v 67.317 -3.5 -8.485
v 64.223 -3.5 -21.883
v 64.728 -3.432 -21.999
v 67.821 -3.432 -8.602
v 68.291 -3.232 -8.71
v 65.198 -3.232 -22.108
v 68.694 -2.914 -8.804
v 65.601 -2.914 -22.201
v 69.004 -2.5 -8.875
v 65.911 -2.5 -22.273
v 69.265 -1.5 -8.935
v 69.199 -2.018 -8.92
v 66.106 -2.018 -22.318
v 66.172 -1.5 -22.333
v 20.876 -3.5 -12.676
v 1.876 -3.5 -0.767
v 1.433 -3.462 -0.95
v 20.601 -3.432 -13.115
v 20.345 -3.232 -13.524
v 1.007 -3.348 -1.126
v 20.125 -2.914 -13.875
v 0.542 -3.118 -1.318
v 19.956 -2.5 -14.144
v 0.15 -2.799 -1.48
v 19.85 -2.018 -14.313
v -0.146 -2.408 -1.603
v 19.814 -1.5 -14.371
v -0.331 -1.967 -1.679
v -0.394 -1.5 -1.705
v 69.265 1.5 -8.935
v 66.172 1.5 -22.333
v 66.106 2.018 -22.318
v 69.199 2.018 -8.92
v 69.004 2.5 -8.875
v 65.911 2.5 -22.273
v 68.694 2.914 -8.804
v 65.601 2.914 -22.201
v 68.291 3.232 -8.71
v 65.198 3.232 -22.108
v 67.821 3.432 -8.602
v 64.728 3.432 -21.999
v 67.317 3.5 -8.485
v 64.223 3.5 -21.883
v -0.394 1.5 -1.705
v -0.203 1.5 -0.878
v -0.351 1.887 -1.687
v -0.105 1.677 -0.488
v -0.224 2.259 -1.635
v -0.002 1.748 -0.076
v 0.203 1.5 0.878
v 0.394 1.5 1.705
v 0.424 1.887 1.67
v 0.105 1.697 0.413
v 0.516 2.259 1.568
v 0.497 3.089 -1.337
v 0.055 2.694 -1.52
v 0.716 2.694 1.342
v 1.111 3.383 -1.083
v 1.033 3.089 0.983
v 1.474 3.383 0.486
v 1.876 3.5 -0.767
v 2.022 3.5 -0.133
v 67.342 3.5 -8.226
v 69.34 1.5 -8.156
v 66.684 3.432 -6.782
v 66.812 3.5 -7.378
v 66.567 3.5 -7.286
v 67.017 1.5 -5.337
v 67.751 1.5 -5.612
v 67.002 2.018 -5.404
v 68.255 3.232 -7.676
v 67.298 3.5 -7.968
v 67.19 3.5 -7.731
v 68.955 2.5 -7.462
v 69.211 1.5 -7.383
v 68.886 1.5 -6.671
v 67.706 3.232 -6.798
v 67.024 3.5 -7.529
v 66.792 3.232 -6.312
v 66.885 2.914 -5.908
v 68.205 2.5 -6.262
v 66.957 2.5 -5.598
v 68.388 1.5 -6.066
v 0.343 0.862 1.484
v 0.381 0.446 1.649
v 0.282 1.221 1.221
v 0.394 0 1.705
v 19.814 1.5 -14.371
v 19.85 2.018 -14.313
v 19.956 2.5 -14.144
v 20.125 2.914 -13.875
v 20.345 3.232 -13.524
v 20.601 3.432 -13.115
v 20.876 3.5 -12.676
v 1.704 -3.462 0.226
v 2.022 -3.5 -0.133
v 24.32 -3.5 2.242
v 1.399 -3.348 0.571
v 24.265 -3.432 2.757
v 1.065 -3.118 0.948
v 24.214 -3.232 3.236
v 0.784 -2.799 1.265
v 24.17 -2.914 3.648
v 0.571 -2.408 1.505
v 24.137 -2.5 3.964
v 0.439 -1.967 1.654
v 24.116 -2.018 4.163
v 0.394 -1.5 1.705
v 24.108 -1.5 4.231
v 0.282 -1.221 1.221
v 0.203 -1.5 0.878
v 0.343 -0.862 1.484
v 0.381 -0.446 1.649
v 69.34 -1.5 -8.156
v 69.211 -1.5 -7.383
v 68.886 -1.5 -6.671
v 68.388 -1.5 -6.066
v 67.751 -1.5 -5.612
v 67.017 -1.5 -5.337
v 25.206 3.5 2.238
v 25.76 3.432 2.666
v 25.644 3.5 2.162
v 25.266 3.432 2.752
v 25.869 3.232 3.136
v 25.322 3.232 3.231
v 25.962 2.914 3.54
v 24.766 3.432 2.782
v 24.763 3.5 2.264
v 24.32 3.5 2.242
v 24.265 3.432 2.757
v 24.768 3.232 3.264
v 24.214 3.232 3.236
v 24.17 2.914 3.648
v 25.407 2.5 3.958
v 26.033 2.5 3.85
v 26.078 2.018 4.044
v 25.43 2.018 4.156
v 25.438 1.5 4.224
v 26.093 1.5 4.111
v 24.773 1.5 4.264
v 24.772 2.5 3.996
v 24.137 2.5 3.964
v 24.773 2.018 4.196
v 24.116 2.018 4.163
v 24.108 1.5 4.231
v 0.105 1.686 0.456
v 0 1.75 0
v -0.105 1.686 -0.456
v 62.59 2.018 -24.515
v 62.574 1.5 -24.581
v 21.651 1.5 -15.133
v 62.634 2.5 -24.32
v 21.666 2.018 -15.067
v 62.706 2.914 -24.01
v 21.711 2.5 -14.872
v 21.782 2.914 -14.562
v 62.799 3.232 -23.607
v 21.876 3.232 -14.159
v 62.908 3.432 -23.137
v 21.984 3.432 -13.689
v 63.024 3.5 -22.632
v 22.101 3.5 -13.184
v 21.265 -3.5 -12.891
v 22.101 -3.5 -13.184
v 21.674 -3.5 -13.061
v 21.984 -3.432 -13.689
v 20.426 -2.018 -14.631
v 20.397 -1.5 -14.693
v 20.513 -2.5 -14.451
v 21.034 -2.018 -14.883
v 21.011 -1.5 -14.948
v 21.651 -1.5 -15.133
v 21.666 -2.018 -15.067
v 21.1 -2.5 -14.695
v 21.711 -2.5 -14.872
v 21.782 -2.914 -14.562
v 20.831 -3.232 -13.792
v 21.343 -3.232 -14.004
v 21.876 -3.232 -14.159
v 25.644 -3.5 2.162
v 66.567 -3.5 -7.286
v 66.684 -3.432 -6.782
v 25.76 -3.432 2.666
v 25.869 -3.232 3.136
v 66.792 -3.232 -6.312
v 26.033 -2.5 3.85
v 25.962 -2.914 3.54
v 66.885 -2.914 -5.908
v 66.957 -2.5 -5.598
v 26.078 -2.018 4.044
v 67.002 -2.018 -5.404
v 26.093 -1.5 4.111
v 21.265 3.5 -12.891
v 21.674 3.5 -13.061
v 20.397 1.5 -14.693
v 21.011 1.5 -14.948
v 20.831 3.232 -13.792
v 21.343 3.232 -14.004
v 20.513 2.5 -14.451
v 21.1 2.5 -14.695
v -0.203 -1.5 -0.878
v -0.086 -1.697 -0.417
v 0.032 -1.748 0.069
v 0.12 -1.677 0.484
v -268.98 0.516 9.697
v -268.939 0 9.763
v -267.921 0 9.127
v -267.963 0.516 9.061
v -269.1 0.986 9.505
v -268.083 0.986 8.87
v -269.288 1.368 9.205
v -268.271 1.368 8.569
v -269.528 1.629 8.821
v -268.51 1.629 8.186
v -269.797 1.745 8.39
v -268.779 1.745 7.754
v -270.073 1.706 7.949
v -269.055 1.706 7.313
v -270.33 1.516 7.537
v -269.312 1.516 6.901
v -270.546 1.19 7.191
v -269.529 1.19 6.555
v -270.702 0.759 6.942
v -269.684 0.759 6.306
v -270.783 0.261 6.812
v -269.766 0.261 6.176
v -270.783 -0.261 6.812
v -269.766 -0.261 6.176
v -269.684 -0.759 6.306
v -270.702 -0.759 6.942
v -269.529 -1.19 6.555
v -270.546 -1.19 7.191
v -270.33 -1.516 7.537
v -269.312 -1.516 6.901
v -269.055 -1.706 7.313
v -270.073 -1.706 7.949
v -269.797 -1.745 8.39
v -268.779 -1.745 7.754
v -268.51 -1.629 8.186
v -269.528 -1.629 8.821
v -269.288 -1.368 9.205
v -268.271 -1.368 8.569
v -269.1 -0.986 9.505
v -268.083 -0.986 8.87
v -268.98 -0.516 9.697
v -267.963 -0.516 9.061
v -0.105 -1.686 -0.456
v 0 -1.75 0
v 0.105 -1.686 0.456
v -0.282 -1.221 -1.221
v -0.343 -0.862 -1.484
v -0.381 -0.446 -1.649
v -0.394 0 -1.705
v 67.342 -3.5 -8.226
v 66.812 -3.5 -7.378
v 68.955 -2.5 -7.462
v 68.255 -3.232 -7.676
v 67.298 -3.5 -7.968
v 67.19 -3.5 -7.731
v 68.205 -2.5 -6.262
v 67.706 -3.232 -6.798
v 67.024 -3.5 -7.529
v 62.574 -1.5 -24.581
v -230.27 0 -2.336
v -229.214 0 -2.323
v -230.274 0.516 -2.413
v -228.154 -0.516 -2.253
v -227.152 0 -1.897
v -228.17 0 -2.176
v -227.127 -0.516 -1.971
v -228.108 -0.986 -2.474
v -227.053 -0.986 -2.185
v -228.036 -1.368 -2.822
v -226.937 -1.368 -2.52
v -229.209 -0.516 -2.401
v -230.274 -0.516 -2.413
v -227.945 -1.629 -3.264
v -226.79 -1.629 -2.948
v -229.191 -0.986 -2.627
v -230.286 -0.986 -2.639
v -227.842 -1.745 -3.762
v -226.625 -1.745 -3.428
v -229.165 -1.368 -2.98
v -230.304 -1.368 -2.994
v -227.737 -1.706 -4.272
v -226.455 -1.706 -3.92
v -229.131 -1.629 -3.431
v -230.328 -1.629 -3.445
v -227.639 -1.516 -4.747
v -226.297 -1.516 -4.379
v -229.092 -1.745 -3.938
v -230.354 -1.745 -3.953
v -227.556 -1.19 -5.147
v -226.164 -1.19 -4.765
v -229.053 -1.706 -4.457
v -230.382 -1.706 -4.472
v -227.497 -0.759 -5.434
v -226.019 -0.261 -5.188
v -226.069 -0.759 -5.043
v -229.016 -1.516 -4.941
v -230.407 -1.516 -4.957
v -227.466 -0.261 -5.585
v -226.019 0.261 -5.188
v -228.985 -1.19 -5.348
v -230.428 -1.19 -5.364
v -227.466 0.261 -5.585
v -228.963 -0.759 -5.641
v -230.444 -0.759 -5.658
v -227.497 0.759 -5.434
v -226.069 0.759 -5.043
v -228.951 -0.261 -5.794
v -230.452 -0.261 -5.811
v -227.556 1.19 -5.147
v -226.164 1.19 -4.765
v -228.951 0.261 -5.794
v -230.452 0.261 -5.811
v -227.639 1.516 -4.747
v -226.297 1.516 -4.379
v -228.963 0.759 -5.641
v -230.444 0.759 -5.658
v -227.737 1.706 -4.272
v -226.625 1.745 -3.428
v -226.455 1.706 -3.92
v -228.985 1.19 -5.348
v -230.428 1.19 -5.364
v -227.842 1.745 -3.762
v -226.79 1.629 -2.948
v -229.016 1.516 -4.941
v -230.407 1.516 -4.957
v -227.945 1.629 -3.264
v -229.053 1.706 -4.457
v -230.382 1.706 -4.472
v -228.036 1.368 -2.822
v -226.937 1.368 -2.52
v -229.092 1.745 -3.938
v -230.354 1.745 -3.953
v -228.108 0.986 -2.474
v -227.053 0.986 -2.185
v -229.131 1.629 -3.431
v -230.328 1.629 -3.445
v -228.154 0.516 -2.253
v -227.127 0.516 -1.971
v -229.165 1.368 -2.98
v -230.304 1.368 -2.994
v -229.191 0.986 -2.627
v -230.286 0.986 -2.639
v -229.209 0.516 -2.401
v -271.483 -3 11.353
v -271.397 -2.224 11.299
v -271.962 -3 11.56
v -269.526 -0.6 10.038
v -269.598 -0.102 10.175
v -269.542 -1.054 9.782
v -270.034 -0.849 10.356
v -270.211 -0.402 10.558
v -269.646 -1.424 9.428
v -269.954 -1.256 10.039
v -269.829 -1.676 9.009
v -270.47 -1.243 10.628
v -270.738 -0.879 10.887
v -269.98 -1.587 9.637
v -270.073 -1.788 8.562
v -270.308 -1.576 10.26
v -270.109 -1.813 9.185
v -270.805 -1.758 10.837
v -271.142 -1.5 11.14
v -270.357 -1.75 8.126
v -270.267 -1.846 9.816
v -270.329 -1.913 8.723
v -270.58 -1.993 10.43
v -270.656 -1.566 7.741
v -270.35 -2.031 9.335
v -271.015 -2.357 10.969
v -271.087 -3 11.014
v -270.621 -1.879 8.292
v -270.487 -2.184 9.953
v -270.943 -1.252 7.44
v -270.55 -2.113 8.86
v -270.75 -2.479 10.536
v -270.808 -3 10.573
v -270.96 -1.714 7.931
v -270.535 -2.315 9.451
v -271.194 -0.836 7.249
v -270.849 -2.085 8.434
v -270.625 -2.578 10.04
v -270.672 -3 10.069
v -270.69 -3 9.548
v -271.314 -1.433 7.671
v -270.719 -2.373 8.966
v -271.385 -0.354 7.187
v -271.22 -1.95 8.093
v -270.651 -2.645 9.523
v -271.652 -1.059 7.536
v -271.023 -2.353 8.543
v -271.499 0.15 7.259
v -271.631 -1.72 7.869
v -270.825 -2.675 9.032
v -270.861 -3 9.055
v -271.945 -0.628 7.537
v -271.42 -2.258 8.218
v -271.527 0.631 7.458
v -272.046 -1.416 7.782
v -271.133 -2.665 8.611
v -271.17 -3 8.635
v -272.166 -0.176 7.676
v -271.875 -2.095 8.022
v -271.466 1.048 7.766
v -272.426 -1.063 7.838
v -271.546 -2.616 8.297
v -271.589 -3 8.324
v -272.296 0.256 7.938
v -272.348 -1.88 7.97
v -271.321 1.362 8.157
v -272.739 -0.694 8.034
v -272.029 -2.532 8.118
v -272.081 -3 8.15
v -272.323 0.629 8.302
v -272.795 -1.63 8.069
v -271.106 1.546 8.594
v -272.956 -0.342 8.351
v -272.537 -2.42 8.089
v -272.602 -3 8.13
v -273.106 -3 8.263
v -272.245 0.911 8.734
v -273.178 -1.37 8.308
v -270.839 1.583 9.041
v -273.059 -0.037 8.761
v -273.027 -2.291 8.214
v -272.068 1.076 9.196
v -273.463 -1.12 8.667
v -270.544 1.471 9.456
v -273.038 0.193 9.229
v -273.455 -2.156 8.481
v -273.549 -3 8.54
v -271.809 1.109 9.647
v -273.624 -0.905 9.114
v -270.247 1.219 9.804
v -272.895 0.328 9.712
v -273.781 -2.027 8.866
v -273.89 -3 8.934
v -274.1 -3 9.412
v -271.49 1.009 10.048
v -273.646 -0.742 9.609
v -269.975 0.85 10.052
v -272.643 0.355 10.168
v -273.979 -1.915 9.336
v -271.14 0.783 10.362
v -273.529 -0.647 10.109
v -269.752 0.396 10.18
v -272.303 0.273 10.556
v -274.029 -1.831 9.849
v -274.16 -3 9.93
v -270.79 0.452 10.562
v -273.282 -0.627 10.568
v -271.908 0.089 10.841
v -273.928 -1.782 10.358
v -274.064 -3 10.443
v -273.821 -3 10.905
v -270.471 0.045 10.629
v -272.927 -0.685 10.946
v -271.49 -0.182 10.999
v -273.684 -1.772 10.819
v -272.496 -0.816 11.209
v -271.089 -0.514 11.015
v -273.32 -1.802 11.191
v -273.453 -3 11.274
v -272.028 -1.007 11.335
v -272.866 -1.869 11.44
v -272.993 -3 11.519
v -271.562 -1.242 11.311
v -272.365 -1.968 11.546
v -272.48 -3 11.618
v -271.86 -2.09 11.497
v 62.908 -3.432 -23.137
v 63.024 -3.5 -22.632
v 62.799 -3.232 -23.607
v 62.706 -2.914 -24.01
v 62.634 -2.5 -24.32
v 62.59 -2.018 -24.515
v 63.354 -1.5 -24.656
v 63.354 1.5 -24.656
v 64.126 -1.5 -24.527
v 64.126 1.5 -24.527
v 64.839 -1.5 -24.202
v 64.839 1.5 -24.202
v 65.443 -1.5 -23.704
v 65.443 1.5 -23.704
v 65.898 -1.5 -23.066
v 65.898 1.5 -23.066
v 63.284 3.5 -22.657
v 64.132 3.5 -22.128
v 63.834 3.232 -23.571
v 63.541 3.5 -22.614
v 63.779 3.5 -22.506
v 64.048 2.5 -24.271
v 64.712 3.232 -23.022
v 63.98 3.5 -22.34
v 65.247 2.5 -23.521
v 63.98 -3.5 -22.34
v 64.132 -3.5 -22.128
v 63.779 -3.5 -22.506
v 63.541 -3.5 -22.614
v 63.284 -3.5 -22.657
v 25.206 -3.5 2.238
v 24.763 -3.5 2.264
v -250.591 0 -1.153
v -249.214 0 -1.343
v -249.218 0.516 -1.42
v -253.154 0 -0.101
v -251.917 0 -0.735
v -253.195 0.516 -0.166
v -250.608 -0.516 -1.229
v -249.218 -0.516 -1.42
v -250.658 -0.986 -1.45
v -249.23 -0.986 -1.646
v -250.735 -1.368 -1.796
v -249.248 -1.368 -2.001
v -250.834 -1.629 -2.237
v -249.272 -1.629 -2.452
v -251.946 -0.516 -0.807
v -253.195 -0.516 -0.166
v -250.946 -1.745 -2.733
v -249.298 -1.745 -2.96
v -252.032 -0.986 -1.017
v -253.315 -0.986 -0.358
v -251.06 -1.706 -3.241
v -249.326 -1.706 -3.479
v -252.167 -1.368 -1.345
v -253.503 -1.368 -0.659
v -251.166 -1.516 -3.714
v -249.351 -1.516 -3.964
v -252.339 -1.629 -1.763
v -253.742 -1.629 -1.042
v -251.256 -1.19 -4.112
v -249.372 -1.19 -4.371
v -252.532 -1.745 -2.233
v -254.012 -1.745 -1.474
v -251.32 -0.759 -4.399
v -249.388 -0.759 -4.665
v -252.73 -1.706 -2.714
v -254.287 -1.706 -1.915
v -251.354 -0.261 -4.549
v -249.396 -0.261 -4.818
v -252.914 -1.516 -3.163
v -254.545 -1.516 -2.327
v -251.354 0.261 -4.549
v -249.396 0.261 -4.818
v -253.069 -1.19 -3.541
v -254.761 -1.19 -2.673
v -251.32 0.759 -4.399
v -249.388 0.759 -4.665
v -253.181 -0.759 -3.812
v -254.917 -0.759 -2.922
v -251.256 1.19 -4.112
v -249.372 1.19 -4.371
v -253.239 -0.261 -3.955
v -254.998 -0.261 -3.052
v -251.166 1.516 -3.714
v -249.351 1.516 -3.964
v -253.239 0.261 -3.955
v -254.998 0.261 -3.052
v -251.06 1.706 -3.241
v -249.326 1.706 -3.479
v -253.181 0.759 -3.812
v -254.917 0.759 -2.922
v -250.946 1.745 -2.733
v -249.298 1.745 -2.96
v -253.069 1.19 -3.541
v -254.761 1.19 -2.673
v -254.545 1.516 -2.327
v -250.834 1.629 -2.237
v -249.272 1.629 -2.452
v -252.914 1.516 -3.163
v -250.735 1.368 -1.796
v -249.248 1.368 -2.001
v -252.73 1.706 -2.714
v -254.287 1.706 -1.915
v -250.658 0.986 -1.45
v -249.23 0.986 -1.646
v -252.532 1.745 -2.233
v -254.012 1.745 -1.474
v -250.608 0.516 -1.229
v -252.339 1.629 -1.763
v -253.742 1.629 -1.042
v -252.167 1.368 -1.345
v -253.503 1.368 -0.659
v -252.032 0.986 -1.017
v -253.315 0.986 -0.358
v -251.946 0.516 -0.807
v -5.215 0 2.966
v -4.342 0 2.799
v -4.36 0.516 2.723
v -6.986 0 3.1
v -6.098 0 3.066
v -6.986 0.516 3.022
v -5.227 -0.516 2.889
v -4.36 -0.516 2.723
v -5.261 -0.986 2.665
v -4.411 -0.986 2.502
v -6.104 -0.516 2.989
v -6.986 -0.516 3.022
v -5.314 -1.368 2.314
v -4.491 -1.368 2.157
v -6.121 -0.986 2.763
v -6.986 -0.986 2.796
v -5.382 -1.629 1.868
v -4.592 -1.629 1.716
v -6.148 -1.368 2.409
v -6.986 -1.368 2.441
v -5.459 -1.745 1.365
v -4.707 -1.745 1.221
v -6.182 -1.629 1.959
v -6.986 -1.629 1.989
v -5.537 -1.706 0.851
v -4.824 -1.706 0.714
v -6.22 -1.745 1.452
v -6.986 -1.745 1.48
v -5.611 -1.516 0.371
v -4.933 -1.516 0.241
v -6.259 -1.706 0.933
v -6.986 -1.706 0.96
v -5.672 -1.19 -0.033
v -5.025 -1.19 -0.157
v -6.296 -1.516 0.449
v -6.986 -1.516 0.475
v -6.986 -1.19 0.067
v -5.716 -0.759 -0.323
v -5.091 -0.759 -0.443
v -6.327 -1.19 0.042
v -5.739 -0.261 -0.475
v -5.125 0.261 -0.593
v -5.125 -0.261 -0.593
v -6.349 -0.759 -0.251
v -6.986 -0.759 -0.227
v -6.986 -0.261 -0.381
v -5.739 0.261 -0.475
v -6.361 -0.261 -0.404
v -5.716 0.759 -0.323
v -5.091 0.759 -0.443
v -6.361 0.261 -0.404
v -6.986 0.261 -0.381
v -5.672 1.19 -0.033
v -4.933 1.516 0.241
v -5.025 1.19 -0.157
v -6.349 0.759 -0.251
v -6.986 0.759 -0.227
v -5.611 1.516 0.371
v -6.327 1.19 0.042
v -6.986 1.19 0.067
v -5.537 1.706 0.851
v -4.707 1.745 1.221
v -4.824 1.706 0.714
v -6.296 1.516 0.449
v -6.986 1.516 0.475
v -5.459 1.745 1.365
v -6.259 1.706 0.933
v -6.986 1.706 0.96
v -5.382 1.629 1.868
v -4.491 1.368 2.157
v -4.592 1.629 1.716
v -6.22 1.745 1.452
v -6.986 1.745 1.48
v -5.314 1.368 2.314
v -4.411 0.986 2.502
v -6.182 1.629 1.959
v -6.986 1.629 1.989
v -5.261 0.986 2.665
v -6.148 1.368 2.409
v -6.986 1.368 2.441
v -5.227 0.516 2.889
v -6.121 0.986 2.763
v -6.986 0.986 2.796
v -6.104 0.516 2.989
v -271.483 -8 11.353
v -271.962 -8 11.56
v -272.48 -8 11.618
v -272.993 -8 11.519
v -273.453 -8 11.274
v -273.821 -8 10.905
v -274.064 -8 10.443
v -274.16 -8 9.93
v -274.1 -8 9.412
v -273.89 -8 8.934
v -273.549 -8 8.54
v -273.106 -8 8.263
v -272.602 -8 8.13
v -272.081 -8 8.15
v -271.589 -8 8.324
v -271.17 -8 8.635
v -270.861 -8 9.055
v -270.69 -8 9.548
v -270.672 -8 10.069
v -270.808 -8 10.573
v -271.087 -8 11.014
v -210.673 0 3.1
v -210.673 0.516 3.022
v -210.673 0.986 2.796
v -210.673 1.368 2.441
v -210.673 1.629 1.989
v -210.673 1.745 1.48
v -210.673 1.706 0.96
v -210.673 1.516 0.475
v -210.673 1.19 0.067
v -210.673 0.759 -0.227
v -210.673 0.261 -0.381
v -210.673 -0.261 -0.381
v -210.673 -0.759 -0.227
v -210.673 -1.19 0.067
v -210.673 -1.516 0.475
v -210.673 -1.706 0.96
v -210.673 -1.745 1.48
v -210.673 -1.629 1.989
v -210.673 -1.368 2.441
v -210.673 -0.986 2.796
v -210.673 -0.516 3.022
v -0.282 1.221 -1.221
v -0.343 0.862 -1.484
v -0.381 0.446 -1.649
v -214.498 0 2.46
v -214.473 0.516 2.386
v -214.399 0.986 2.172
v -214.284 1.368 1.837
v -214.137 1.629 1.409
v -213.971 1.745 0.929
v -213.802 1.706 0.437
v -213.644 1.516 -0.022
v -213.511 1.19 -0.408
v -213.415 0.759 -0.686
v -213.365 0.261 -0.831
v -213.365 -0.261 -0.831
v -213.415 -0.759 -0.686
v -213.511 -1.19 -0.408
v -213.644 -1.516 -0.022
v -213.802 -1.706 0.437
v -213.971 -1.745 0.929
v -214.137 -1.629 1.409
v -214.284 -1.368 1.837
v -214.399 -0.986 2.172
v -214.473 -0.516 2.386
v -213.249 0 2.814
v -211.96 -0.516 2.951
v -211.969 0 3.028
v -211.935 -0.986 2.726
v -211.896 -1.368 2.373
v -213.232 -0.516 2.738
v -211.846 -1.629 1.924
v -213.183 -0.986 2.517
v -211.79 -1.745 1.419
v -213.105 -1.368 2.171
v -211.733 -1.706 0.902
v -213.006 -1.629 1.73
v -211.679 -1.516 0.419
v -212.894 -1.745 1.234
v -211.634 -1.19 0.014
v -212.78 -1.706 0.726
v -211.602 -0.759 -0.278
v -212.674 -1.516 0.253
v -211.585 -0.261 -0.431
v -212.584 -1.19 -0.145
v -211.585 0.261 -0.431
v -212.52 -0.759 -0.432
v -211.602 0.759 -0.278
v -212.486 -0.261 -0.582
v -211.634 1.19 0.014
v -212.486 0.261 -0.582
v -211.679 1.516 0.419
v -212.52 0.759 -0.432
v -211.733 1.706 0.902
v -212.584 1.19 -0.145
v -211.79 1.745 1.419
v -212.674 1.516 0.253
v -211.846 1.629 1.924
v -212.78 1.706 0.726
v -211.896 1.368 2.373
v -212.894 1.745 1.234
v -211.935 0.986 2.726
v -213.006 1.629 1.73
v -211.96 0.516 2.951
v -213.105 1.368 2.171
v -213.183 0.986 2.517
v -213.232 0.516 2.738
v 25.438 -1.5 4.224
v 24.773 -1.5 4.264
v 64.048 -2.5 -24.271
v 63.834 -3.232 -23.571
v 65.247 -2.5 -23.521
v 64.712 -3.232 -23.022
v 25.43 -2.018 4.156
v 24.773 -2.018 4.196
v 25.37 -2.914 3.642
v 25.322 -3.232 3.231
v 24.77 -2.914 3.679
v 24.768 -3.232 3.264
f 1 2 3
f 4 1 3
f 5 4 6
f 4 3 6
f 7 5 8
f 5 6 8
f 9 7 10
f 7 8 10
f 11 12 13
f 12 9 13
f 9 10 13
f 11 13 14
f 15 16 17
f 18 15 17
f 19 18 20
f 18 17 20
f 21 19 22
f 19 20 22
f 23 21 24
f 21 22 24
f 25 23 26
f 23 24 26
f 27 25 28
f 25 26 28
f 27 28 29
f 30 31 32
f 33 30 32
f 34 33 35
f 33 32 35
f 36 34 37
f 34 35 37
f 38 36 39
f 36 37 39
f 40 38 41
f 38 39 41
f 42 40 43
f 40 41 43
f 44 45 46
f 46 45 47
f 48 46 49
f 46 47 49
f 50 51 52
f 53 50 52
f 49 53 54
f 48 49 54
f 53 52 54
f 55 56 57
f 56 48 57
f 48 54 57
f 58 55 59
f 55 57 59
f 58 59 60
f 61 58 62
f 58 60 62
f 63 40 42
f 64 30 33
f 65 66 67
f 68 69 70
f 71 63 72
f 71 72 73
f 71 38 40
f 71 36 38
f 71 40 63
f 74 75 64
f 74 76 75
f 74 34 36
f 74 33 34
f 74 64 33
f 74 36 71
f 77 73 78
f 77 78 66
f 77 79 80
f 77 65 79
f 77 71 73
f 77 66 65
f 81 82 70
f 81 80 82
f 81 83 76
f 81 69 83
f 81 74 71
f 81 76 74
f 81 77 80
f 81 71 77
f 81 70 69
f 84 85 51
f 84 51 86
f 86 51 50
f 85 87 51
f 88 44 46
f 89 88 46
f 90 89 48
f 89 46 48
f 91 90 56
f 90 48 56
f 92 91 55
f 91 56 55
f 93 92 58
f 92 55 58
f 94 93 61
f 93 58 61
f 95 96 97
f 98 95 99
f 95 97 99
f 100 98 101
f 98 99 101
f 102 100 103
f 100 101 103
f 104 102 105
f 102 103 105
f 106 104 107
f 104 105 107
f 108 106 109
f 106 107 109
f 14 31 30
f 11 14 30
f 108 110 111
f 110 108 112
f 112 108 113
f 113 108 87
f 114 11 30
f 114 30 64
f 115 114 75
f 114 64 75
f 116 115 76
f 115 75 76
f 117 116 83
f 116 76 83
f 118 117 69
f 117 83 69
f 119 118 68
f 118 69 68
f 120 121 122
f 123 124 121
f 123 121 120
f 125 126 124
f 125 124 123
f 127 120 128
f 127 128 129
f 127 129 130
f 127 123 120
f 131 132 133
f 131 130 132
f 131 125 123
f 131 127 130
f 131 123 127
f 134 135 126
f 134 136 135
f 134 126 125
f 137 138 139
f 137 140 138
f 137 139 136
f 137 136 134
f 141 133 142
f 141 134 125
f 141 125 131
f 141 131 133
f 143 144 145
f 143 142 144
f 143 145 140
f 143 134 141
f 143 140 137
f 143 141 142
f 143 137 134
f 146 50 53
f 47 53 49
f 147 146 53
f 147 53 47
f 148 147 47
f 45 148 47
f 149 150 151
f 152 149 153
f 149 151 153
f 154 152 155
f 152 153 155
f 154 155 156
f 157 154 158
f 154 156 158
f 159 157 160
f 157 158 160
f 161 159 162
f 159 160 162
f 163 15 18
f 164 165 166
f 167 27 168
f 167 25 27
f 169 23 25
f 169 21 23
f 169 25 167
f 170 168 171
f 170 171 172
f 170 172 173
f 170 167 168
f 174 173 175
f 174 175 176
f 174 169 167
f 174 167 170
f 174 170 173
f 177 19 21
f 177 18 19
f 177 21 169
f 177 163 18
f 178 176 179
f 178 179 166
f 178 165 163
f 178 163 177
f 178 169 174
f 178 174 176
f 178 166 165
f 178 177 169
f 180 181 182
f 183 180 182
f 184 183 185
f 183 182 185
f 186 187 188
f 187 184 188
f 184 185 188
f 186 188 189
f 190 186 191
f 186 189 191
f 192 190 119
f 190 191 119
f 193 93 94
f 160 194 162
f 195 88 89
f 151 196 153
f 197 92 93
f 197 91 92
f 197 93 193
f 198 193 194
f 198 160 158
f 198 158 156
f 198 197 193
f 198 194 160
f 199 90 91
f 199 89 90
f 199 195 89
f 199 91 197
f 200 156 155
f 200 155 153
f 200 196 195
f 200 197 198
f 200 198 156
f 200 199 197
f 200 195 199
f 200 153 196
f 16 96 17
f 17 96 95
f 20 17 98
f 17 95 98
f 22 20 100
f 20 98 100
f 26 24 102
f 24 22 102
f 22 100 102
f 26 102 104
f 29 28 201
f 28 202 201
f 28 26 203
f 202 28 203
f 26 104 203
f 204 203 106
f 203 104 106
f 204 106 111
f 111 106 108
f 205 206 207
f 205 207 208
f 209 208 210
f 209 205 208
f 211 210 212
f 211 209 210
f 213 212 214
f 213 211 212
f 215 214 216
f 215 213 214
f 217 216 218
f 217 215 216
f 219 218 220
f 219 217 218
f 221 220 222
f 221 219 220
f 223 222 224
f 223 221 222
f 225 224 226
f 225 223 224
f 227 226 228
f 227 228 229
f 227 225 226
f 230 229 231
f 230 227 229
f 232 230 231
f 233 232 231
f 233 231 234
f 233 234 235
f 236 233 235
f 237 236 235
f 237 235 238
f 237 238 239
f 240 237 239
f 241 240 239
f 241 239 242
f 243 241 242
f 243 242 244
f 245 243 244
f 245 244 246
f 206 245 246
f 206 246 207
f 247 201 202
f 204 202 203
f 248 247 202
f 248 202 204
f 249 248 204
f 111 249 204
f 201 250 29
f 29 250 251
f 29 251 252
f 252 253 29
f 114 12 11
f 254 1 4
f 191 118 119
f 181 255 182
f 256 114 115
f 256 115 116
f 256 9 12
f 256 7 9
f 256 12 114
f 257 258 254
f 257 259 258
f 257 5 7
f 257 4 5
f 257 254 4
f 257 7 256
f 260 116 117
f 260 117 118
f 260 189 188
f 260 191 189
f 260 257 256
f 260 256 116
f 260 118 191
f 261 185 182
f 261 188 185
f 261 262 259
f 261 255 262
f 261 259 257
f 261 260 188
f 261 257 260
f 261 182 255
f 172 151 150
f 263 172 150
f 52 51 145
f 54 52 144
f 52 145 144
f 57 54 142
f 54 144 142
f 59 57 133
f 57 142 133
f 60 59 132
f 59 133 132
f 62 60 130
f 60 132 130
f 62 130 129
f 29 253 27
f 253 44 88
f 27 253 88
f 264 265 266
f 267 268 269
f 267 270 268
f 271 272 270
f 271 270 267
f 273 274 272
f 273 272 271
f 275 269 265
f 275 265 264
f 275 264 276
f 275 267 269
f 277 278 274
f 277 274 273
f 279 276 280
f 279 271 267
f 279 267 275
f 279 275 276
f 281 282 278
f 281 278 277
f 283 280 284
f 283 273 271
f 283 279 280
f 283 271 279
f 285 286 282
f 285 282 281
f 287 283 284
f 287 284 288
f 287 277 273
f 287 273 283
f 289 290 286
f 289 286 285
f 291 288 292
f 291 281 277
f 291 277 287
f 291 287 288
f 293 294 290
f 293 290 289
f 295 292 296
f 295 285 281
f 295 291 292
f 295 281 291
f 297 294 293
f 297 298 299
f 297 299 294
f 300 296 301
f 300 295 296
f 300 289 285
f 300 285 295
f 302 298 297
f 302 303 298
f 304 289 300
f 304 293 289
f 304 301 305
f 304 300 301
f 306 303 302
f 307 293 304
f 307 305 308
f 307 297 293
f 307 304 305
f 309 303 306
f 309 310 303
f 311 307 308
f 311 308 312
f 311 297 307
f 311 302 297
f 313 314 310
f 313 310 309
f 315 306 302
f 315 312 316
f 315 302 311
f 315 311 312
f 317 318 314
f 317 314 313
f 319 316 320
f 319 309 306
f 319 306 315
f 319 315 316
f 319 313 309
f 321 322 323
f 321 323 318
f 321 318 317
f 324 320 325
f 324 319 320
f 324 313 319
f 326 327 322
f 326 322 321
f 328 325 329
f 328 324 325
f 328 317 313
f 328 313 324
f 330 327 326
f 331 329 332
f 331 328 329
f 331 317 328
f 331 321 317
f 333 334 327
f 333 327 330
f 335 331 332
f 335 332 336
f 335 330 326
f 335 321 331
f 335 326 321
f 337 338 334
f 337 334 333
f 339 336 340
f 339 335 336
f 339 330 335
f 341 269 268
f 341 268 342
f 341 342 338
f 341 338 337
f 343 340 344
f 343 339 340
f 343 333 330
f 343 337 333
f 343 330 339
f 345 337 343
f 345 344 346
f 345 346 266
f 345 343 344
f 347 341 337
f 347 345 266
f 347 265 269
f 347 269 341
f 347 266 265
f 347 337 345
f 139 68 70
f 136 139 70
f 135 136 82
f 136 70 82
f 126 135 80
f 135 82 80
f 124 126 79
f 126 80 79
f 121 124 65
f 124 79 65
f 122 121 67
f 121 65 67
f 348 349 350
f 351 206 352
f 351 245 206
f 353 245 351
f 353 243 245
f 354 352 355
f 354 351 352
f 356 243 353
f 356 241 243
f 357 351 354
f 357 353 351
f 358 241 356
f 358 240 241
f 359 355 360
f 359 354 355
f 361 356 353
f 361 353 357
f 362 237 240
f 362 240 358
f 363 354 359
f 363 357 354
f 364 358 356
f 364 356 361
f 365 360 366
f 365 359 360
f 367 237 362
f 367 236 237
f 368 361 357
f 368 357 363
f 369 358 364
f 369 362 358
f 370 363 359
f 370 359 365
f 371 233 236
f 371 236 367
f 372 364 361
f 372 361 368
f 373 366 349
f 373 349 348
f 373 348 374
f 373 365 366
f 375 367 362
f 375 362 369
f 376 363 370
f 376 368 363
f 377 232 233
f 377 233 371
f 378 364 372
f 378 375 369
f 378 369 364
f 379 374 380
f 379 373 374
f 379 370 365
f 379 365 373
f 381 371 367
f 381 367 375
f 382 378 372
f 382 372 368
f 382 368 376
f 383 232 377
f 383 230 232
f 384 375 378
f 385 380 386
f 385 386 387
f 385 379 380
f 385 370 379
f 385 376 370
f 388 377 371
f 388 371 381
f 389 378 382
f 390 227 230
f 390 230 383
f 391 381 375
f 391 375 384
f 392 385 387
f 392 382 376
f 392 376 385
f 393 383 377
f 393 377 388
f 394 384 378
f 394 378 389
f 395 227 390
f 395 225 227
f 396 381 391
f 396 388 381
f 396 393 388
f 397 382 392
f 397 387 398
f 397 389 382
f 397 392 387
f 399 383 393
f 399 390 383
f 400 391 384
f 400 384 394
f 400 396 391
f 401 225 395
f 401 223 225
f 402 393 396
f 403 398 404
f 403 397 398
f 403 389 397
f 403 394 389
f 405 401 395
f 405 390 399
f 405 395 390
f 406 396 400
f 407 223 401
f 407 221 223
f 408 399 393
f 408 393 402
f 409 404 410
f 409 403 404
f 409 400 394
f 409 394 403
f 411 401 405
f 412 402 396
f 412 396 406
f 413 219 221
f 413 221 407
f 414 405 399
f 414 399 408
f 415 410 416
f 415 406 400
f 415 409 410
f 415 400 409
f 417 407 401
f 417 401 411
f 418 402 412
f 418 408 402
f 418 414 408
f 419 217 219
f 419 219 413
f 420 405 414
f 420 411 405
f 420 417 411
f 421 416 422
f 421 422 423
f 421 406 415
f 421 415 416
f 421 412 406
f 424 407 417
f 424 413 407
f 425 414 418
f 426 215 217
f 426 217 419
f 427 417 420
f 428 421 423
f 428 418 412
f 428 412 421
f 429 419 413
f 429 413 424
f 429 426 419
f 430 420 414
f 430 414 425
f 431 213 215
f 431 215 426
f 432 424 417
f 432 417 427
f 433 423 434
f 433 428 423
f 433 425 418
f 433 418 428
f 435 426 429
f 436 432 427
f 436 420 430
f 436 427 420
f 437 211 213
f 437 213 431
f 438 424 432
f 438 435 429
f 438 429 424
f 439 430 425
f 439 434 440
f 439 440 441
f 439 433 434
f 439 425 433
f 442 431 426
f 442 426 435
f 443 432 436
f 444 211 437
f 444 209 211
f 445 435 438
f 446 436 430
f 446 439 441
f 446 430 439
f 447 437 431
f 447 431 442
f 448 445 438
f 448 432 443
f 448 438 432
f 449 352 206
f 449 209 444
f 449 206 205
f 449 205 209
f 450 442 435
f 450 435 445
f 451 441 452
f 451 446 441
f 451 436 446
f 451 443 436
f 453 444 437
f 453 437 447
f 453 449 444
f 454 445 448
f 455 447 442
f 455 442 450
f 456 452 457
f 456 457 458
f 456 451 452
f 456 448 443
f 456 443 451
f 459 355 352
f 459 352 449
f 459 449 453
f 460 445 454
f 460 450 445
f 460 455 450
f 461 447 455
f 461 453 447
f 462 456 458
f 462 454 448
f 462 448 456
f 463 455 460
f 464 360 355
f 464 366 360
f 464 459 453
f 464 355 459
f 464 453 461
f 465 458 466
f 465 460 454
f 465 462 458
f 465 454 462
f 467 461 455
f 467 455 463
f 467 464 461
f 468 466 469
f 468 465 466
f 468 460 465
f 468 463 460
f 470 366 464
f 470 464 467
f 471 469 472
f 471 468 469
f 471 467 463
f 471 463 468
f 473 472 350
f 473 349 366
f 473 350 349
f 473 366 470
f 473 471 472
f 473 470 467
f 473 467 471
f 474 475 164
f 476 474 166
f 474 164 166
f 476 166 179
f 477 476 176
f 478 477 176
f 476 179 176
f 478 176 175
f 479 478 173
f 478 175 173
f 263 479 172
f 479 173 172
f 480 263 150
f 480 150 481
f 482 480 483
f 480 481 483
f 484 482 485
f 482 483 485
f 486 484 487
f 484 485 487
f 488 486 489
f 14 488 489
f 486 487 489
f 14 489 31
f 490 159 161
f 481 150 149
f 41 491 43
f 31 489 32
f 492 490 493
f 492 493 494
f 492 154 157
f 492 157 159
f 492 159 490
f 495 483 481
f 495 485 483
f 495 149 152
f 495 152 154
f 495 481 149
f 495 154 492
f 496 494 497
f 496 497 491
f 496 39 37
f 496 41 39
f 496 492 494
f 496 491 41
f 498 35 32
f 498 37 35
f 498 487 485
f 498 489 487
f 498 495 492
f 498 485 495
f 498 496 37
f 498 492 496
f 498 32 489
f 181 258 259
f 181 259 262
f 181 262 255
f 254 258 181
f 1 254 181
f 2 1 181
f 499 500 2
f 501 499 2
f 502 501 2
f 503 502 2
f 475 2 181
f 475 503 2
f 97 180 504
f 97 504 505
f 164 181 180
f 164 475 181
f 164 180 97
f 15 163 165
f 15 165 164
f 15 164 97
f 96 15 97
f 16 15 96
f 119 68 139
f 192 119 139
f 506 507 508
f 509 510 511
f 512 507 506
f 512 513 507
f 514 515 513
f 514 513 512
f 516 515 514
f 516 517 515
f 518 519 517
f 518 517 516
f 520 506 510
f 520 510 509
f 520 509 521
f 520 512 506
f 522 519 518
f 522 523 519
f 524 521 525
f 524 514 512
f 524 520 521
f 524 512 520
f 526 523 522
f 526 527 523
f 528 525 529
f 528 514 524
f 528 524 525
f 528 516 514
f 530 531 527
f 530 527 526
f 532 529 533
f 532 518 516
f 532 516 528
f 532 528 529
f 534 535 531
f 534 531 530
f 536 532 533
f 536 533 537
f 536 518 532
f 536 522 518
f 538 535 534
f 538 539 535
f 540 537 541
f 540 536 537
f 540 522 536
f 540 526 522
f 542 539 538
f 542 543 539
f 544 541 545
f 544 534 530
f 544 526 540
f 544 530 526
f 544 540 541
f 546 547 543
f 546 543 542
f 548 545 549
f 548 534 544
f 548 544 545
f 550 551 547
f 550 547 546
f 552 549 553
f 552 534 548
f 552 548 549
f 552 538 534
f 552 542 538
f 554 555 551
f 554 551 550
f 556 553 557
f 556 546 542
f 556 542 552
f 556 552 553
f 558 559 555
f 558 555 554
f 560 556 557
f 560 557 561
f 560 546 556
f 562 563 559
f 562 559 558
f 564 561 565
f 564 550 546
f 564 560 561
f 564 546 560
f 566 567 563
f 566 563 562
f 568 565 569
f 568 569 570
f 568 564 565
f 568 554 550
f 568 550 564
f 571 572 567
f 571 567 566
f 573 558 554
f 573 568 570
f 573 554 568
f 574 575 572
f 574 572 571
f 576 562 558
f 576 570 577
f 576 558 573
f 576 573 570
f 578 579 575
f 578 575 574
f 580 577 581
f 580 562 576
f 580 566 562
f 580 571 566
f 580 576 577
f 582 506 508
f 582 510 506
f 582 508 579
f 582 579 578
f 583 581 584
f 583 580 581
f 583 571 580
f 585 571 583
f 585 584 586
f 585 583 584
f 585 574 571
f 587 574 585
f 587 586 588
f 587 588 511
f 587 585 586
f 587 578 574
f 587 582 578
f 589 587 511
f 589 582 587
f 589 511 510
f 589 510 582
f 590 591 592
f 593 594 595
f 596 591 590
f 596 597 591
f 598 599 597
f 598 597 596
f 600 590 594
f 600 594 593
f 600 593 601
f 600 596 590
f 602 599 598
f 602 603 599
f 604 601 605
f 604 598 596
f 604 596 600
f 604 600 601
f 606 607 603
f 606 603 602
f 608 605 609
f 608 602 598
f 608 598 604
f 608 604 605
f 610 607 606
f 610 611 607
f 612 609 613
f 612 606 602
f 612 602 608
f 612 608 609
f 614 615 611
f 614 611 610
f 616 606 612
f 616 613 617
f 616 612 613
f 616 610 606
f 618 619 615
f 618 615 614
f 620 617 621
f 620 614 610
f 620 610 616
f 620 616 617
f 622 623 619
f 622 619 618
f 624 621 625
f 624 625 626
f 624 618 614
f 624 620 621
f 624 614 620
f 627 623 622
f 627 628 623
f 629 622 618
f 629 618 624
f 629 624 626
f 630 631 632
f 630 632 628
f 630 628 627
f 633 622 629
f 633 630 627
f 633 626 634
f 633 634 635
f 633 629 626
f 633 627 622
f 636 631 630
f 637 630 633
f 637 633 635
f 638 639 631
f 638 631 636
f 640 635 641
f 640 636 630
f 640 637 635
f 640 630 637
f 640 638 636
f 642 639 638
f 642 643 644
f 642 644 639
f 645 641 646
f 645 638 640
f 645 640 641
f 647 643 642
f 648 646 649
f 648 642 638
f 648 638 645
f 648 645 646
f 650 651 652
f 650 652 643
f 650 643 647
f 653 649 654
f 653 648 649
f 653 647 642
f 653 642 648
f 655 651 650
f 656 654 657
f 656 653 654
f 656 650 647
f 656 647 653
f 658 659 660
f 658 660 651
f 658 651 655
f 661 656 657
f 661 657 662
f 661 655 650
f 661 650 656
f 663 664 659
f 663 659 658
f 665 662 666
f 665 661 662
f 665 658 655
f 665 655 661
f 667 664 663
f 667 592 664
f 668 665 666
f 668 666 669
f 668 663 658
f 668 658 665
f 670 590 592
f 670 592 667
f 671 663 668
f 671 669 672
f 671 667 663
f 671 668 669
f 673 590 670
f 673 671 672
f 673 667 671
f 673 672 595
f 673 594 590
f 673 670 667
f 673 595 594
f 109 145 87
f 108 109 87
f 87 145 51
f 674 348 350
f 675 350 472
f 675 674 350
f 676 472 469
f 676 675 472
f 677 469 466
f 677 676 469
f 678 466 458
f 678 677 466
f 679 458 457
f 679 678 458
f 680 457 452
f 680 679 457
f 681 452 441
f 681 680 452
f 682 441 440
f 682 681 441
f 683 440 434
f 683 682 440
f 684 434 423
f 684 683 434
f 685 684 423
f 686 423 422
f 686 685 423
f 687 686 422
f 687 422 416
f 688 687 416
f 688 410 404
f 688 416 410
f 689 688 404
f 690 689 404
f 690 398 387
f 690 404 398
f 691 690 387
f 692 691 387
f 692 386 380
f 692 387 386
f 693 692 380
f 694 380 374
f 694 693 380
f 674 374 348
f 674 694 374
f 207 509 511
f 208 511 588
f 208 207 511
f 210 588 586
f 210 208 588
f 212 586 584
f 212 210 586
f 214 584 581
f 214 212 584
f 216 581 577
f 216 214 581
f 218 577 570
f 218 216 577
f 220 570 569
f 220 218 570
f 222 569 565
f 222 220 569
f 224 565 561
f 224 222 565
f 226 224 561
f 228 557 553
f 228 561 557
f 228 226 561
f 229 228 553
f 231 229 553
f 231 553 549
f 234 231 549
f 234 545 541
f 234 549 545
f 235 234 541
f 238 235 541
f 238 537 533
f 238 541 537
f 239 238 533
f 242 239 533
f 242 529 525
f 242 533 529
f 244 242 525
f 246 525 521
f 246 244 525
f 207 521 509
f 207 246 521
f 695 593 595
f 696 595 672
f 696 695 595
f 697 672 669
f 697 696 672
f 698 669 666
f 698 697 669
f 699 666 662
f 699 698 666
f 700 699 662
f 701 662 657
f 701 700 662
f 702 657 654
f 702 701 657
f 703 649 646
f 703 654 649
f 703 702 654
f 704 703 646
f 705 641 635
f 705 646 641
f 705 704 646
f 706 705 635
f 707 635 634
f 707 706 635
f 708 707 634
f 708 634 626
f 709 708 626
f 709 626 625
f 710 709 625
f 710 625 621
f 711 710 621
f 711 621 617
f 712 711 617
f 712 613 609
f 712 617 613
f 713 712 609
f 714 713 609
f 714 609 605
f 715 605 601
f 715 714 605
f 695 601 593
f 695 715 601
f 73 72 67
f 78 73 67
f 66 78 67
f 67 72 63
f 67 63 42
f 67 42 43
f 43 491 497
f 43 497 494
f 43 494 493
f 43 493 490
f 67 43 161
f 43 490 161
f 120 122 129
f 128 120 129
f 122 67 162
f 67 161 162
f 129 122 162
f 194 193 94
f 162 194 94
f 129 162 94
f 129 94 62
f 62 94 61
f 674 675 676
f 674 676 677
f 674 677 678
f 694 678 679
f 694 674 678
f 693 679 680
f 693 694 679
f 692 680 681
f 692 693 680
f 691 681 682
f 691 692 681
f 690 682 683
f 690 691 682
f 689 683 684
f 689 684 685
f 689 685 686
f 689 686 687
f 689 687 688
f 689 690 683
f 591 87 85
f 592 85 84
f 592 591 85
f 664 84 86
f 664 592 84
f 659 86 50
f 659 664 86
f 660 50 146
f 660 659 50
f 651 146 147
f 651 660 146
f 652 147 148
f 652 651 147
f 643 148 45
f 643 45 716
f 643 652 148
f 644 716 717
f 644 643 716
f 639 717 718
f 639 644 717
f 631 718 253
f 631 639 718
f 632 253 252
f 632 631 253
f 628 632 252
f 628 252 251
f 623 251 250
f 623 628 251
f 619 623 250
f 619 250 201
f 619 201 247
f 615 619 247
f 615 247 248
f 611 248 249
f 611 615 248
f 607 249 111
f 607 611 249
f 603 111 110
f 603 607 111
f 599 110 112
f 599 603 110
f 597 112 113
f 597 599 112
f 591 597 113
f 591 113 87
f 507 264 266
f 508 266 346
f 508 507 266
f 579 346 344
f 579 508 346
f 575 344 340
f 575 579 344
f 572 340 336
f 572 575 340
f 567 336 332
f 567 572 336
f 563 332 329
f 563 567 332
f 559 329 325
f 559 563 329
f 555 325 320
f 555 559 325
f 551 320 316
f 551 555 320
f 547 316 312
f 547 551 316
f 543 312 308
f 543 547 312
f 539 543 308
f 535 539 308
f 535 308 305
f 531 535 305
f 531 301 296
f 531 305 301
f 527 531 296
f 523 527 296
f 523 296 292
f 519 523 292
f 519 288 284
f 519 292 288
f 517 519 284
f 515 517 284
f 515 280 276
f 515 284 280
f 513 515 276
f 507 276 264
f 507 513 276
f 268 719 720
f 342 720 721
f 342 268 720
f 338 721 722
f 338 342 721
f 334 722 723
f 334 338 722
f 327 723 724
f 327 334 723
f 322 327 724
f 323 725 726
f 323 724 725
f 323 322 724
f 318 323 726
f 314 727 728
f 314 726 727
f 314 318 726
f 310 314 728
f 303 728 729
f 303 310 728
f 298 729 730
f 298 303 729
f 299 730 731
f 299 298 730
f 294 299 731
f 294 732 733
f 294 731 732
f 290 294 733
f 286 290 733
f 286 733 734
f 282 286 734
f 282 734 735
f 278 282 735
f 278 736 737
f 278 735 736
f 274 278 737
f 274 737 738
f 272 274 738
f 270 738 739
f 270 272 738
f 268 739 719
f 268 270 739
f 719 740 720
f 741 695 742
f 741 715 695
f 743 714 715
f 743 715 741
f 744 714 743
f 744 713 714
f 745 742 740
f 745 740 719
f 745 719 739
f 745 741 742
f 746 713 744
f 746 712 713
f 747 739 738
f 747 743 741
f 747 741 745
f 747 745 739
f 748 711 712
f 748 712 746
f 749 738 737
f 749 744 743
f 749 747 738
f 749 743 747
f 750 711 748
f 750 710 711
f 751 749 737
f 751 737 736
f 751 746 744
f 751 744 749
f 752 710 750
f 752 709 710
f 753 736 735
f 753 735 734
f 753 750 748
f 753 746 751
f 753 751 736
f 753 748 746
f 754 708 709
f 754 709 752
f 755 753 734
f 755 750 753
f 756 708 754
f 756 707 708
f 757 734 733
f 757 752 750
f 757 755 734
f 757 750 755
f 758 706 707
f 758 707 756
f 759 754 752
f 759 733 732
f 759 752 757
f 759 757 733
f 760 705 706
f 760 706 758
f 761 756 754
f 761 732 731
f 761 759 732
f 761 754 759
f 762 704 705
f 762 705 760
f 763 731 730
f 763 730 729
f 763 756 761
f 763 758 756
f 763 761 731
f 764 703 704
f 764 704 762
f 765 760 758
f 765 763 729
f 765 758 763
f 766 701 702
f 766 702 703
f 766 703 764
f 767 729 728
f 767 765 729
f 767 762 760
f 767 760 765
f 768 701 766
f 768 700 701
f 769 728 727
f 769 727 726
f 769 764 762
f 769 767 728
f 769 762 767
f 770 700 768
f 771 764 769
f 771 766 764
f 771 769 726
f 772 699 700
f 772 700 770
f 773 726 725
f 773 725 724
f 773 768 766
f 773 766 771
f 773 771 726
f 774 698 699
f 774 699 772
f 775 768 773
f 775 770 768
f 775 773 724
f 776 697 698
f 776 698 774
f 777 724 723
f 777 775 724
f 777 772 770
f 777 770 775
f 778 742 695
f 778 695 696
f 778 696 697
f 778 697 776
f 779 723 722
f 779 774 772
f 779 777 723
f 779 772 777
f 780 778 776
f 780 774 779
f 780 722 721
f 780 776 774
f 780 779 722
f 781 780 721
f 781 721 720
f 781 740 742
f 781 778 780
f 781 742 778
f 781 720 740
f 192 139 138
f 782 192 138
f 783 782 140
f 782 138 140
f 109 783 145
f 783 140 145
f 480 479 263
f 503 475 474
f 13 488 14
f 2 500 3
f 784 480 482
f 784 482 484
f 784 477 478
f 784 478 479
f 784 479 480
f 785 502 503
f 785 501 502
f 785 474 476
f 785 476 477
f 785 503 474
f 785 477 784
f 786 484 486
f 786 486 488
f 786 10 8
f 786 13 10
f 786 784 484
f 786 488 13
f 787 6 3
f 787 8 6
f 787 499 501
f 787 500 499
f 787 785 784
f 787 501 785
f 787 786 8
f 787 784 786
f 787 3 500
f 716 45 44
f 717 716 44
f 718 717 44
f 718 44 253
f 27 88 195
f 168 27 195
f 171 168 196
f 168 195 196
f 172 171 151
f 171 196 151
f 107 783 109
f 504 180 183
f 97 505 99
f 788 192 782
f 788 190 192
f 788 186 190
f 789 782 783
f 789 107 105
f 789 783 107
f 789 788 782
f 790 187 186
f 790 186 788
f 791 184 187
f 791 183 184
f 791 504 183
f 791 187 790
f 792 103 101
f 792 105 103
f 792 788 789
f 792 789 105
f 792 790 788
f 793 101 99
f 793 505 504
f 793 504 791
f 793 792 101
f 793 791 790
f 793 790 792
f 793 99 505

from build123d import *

# Parameters (mm, degrees)
SKETCH11_R          = 1.75
SKETCH8_R           = 1.75
BOSS_EXTRUDE1_DEPTH = 3.5
FILLET1_R           = 2
FILLET2_R           = 2


with BuildPart() as part:
    # Sweep1: sweep along a path in Sketch1
    with BuildLine(Plane(origin=(0, 0, 0), x_dir=(1, 0, 0), z_dir=(0, 1, 0))) as sweep1_path:
        Line((0, 0), (-4.736065928, -1.093406974))
        ThreePointArc((-4.736065928, -1.093406974), (-5.853544334, -1.285424883), (-6.985576472, -1.349706326))
        Line((-6.985576472, -1.349706326), (-210.672794298, -1.349706326))
        ThreePointArc((-210.672794298, -1.349706326), (-212.323270357, -1.212562341), (-213.928475842, -0.804892082))
        Line((-213.928475842, -0.804892082), (-226.582134244, 3.552111915))
        ThreePointArc((-226.582134244, 3.552111915), (-228.446084779, 3.999606846), (-230.361175351, 4.083221506))
        Line((-230.361175351, 4.083221506), (-249.305198661, 3.090407314))
        ThreePointArc((-249.305198661, 3.090407314), (-251.788897094, 2.641281474), (-254.081031741, 1.584592928))
        Line((-254.081031741, 1.584592928), (-268.848792164, -7.643327957))
    # Sketch11 → Sweep1 (sweep)
    with BuildSketch(Plane(origin=(0, 0, 0), x_dir=(0.22495105434386561, 0, 0.9743700647852351), z_dir=(-0.9743700647852351, 0, 0.22495105434386561))):
        Circle(SKETCH11_R)
    sweep(path=sweep1_path.line)

    # Sweep3: sweep along a curve in space
    with BuildLine() as sweep3_path:
        Line((-272.410594168, -3, 9.868988866), (-272.410594168, -8, 9.868988866))
        ThreePointArc((-269.866449879, 0, 8.279231074), (-271.665431558, -0.878679656, 9.403359589), (-272.410594168, -3, 9.868988866))
        Line((-269.866449879, 0, 8.279231074), (-268.848792164, 0, 7.643327957))
    # Sketch8 → Sweep3 (sweep)
    with BuildSketch(Plane(origin=(-196.787061579, 0, 122.966203633), x_dir=(0.5299192642332071, 0, 0.8480480961564246), z_dir=(-0.8480480961564246, 0, 0.5299192642332071))):
        with Locations((-135.986244411, 0)):
            Circle(SKETCH8_R)
    sweep(path=sweep3_path.line)

    # Sketch5 → Boss-Extrude1 (add, symmetric)
    with BuildSketch(Plane(origin=(0, 0, 0), x_dir=(1, 0, 0), z_dir=(0, 1, 0))):
        with BuildLine():
            Line((-0.393664345, 1.705147613), (19.813870271, 14.370895509))
            ThreePointArc((19.813870271, 14.370895509), (20.700469104, 14.828681695), (21.650674926, 15.133205221))
            Line((21.650674926, 15.133205221), (62.574217647, 24.581149504))
            ThreePointArc((62.574217647, 24.581149504), (64.838828602, 24.202183598), (66.172181004, 22.332892472))
            Line((66.172181004, 22.332892472), (69.265258001, 8.935304082))
            ThreePointArc((69.265258001, 8.935304082), (68.886292095, 6.670693126), (67.01700097, 5.337340724))
            Line((67.01700097, 5.337340724), (26.093458249, -4.110603558))
            ThreePointArc((26.093458249, -4.110603558), (25.105924586, -4.253442442), (24.108374578, -4.230646291))
            Line((24.108374578, -4.230646291), (0.393664345, -1.705147613))
            Line((0.393664345, -1.705147613), (-0.393664345, 1.705147613))
        make_face()
    extrude(amount=BOSS_EXTRUDE1_DEPTH, both=True)

    # Fillet1
    # the kernel refuses this fillet: 2 mm, written as the material it takes off along each edge
    with BuildSketch(Plane(origin=(23.000381252, 3.5, -9.286984832), x_dir=(-0.5310851635150788, 0, -0.8473184460957769), z_dir=(-0.8473184460957769, 0, 0.5310851635150788))) as fillet1_piece_1:
        with BuildLine():
            CenterArc((6 - FILLET1_R, FILLET1_R), FILLET1_R, 270, 90)
            Line((6, FILLET1_R), (6, 0))
            Line((6, 0), (6 - FILLET1_R, 0))
        make_face()
    revolve(axis=Axis((23.000381252, 3.5, -9.286984832), (0, -1, 0)), revolution_arc=19.078804313, mode=Mode.SUBTRACT)
    with BuildSketch(Plane(origin=(-4.630256576, 3.5, 0.950278204), x_dir=(0, -1, 0), z_dir=(0.8473184460957748, 0, -0.5310851635150823))) as fillet1_piece_2_section:
        with BuildLine():
            CenterArc((FILLET1_R, -FILLET1_R), FILLET1_R, 90, 90)
            Line((0, -FILLET1_R), (0, 0))
            Line((0, 0), (FILLET1_R, 0))
        make_face()
    fillet1_piece_2 = extrude(amount=28.848807622, mode=Mode.PRIVATE)
    fillet1_piece_2 = split(fillet1_piece_2, bisect_by=Plane(origin=(-1.099290547, 3.044511154, -4.761550481), z_dir=(0.9743700647852351, 0, -0.22495105434386561)), keep=Keep.TOP, mode=Mode.PRIVATE)
    add(fillet1_piece_2, mode=Mode.SUBTRACT)
    with BuildSketch(Plane(origin=(1.518419617, 3.5, 6.576997937), x_dir=(0, -1, 0), z_dir=(-0.22495105434386561, 0, -0.9743700647852351))) as fillet1_piece_3_section:
        with BuildLine():
            CenterArc((FILLET1_R, -FILLET1_R), FILLET1_R, 90, 90)
            Line((0, -FILLET1_R), (0, 0))
            Line((0, 0), (FILLET1_R, 0))
        make_face()
    fillet1_piece_3 = extrude(amount=13.5, mode=Mode.PRIVATE)
    fillet1_piece_3 = fillet1_piece_3 - Plane(origin=(0.460325238, 0, -0.106274455), x_dir=(0.22495105434386553, 0, 0.9743700647852351), z_dir=(-0.9743700647852351, 0, 0.22495105434386553)) * Cylinder(1.75, 36, mode=Mode.PRIVATE)
    add(fillet1_piece_3, mode=Mode.SUBTRACT)
    with BuildSketch(Plane(origin=(24.108374578, 3.5, 4.230646291), x_dir=(0, -1, 0), z_dir=(-0.9943771868431155, 0, -0.10589622413463053))) as fillet1_piece_4_section:
        with BuildLine():
            CenterArc((FILLET1_R, -FILLET1_R), FILLET1_R, 90, 90)
            Line((0, -FILLET1_R), (0, 0))
            Line((0, 0), (FILLET1_R, 0))
        make_face()
    fillet1_piece_4 = extrude(amount=28.848807622, mode=Mode.PRIVATE)
    fillet1_piece_4 = split(fillet1_piece_4, bisect_by=Plane(origin=(1.099289941, 3.044511564, 4.761547859), z_dir=(0.9743700647852351, 0, -0.22495105434386561)), keep=Keep.TOP, mode=Mode.PRIVATE)
    add(fillet1_piece_4, mode=Mode.SUBTRACT)
    with BuildSketch(Plane(origin=(24.743751923, 3.5, -1.73561683), x_dir=(0.22495105434386634, 0, 0.9743700647852349), z_dir=(0.9743700647852349, 0, -0.22495105434386634))) as fillet1_piece_5:
        with BuildLine():
            CenterArc((6 - FILLET1_R, FILLET1_R), FILLET1_R, 270, 90)
            Line((6, FILLET1_R), (6, 0))
            Line((6, 0), (6 - FILLET1_R, 0))
        make_face()
    revolve(axis=Axis((24.743751923, 3.5, -1.73561683), (0, -1, 0)), revolution_arc=19.078804313, mode=Mode.SUBTRACT)
    with BuildSketch(Plane(origin=(67.01700097, 3.5, -5.337340724), x_dir=(-0.22495105434386584, 0, -0.9743700647852351), z_dir=(-0.9743700647852351, 0, 0.22495105434386584)), Plane(origin=(21.650674926, 3.5, -15.133205221), x_dir=(0.22495105434386575, 0, 0.974370064785235), z_dir=(0.9743700647852351, 0, -0.22495105434386578))) as fillet1_piece_6:
        with BuildLine():
            CenterArc((FILLET1_R, FILLET1_R), FILLET1_R, 180, 90)
            Line((0, FILLET1_R), (0, 0))
            Line((0, 0), (FILLET1_R, 0))
        make_face()
    extrude(amount=42, mode=Mode.SUBTRACT)
    with BuildSketch(Plane(origin=(66.342147807, 3.5, -8.260450918), x_dir=(0.9743700647852359, 0, -0.22495105434386237), z_dir=(-0.22495105434386237, 0, -0.9743700647852359))) as fillet1_piece_7:
        with BuildLine():
            CenterArc((3 - FILLET1_R, FILLET1_R), FILLET1_R, 270, 90)
            Line((3, FILLET1_R), (3, 0))
            Line((3, 0), (3 - FILLET1_R, 0))
        make_face()
    revolve(axis=Axis((66.342147807, 3.5, -8.260450918), (0, -1, 0)), revolution_arc=90, mode=Mode.SUBTRACT)
    with BuildSketch(Plane(origin=(66.172181004, 3.5, -22.332892472), x_dir=(-0.9743700647852351, 0, 0.22495105434386561), z_dir=(0.2249510543438656, 0, 0.9743700647852351))) as fillet1_piece_8:
        with BuildLine():
            CenterArc((FILLET1_R, FILLET1_R), FILLET1_R, 180, 90)
            Line((0, FILLET1_R), (0, 0))
            Line((0, 0), (FILLET1_R, 0))
        make_face()
    extrude(amount=13.75, mode=Mode.SUBTRACT)
    with BuildSketch(Plane(origin=(63.24907081, 3.5, -21.658039309), x_dir=(-0.22495105434387033, 0, -0.974370064785234), z_dir=(-0.974370064785234, 0, 0.22495105434387033))) as fillet1_piece_9:
        with BuildLine():
            CenterArc((3 - FILLET1_R, FILLET1_R), FILLET1_R, 270, 90)
            Line((3, FILLET1_R), (3, 0))
            Line((3, 0), (3 - FILLET1_R, 0))
        make_face()
    revolve(axis=Axis((63.24907081, 3.5, -21.658039309), (0, -1, 0)), revolution_arc=90, mode=Mode.SUBTRACT)

    # Fillet2
    # the kernel refuses this fillet: 2 mm, written as the material it takes off along each edge
    with BuildSketch(Plane(origin=(23.000381252, -3.5, -9.286984832), x_dir=(-0.5310851635150788, 0, -0.8473184460957769), z_dir=(-0.8473184460957769, 0, 0.5310851635150788))) as fillet2_piece_1:
        with BuildLine():
            CenterArc((6 - FILLET2_R, -FILLET2_R), FILLET2_R, 0, 90)
            Line((6, -FILLET2_R), (6, 0))
            Line((6, 0), (6 - FILLET2_R, 0))
        make_face()
    revolve(axis=Axis((23.000381252, -3.5, -9.286984832), (0, -1, 0)), revolution_arc=19.078804313, mode=Mode.SUBTRACT)
    with BuildSketch(Plane(origin=(-4.630256576, -3.5, 0.950278204), x_dir=(0, 1, 0), z_dir=(0.8473184460957748, 0, -0.5310851635150823))) as fillet2_piece_2_section:
        with BuildLine():
            CenterArc((FILLET2_R, FILLET2_R), FILLET2_R, 180, 90)
            Line((0, FILLET2_R), (0, 0))
            Line((0, 0), (FILLET2_R, 0))
        make_face()
    fillet2_piece_2 = extrude(amount=28.848807622, mode=Mode.PRIVATE)
    fillet2_piece_2 = split(fillet2_piece_2, bisect_by=Plane(origin=(-1.099290547, -3.044511154, -4.761550481), z_dir=(0.9743700647852351, 0, -0.22495105434386561)), keep=Keep.TOP, mode=Mode.PRIVATE)
    add(fillet2_piece_2, mode=Mode.SUBTRACT)
    with BuildSketch(Plane(origin=(1.518419617, -3.5, 6.576997937), x_dir=(0, 1, 0), z_dir=(-0.22495105434386561, 0, -0.9743700647852351))) as fillet2_piece_3_section:
        with BuildLine():
            CenterArc((FILLET2_R, FILLET2_R), FILLET2_R, 180, 90)
            Line((0, FILLET2_R), (0, 0))
            Line((0, 0), (FILLET2_R, 0))
        make_face()
    fillet2_piece_3 = extrude(amount=13.5, mode=Mode.PRIVATE)
    fillet2_piece_3 = fillet2_piece_3 - Plane(origin=(0.460325238, 0, -0.106274455), x_dir=(0.22495105434386553, 0, 0.9743700647852351), z_dir=(-0.9743700647852351, 0, 0.22495105434386553)) * Cylinder(1.75, 36, mode=Mode.PRIVATE)
    add(fillet2_piece_3, mode=Mode.SUBTRACT)
    with BuildSketch(Plane(origin=(24.108374578, -3.5, 4.230646291), x_dir=(0, 1, 0), z_dir=(-0.9943771868431155, 0, -0.10589622413463053))) as fillet2_piece_4_section:
        with BuildLine():
            CenterArc((FILLET2_R, FILLET2_R), FILLET2_R, 180, 90)
            Line((0, FILLET2_R), (0, 0))
            Line((0, 0), (FILLET2_R, 0))
        make_face()
    fillet2_piece_4 = extrude(amount=28.848807622, mode=Mode.PRIVATE)
    fillet2_piece_4 = split(fillet2_piece_4, bisect_by=Plane(origin=(1.099289941, -3.044511564, 4.761547859), z_dir=(0.9743700647852351, 0, -0.22495105434386561)), keep=Keep.TOP, mode=Mode.PRIVATE)
    add(fillet2_piece_4, mode=Mode.SUBTRACT)
    with BuildSketch(Plane(origin=(24.743751923, -3.5, -1.73561683), x_dir=(0.22495105434386634, 0, 0.9743700647852349), z_dir=(0.9743700647852349, 0, -0.22495105434386634))) as fillet2_piece_5:
        with BuildLine():
            CenterArc((6 - FILLET2_R, -FILLET2_R), FILLET2_R, 0, 90)
            Line((6, -FILLET2_R), (6, 0))
            Line((6, 0), (6 - FILLET2_R, 0))
        make_face()
    revolve(axis=Axis((24.743751923, -3.5, -1.73561683), (0, -1, 0)), revolution_arc=19.078804313, mode=Mode.SUBTRACT)
    with BuildSketch(Plane(origin=(67.01700097, -3.5, -5.337340724), x_dir=(-0.22495105434386584, 0, -0.9743700647852351), z_dir=(-0.9743700647852351, 0, 0.22495105434386584)), Plane(origin=(21.650674926, -3.5, -15.133205221), x_dir=(0.22495105434386575, 0, 0.974370064785235), z_dir=(0.9743700647852351, 0, -0.22495105434386578))) as fillet2_piece_6:
        with BuildLine():
            CenterArc((FILLET2_R, -FILLET2_R), FILLET2_R, 90, 90)
            Line((0, -FILLET2_R), (0, 0))
            Line((0, 0), (FILLET2_R, 0))
        make_face()
    extrude(amount=42, mode=Mode.SUBTRACT)
    with BuildSketch(Plane(origin=(66.342147807, -3.5, -8.260450918), x_dir=(0.9743700647852359, 0, -0.22495105434386237), z_dir=(-0.22495105434386237, 0, -0.9743700647852359))) as fillet2_piece_7:
        with BuildLine():
            CenterArc((3 - FILLET2_R, -FILLET2_R), FILLET2_R, 0, 90)
            Line((3, -FILLET2_R), (3, 0))
            Line((3, 0), (3 - FILLET2_R, 0))
        make_face()
    revolve(axis=Axis((66.342147807, -3.5, -8.260450918), (0, -1, 0)), revolution_arc=90, mode=Mode.SUBTRACT)
    with BuildSketch(Plane(origin=(66.172181004, -3.5, -22.332892472), x_dir=(-0.9743700647852351, 0, 0.22495105434386561), z_dir=(0.2249510543438656, 0, 0.9743700647852351))) as fillet2_piece_8:
        with BuildLine():
            CenterArc((FILLET2_R, -FILLET2_R), FILLET2_R, 90, 90)
            Line((0, -FILLET2_R), (0, 0))
            Line((0, 0), (FILLET2_R, 0))
        make_face()
    extrude(amount=13.75, mode=Mode.SUBTRACT)
    with BuildSketch(Plane(origin=(63.24907081, -3.5, -21.658039309), x_dir=(-0.22495105434387033, 0, -0.974370064785234), z_dir=(-0.974370064785234, 0, 0.22495105434387033))) as fillet2_piece_9:
        with BuildLine():
            CenterArc((3 - FILLET2_R, -FILLET2_R), FILLET2_R, 0, 90)
            Line((3, -FILLET2_R), (3, 0))
            Line((3, 0), (3 - FILLET2_R, 0))
        make_face()
    revolve(axis=Axis((63.24907081, -3.5, -21.658039309), (0, -1, 0)), revolution_arc=90, mode=Mode.SUBTRACT)


solid = part.part
